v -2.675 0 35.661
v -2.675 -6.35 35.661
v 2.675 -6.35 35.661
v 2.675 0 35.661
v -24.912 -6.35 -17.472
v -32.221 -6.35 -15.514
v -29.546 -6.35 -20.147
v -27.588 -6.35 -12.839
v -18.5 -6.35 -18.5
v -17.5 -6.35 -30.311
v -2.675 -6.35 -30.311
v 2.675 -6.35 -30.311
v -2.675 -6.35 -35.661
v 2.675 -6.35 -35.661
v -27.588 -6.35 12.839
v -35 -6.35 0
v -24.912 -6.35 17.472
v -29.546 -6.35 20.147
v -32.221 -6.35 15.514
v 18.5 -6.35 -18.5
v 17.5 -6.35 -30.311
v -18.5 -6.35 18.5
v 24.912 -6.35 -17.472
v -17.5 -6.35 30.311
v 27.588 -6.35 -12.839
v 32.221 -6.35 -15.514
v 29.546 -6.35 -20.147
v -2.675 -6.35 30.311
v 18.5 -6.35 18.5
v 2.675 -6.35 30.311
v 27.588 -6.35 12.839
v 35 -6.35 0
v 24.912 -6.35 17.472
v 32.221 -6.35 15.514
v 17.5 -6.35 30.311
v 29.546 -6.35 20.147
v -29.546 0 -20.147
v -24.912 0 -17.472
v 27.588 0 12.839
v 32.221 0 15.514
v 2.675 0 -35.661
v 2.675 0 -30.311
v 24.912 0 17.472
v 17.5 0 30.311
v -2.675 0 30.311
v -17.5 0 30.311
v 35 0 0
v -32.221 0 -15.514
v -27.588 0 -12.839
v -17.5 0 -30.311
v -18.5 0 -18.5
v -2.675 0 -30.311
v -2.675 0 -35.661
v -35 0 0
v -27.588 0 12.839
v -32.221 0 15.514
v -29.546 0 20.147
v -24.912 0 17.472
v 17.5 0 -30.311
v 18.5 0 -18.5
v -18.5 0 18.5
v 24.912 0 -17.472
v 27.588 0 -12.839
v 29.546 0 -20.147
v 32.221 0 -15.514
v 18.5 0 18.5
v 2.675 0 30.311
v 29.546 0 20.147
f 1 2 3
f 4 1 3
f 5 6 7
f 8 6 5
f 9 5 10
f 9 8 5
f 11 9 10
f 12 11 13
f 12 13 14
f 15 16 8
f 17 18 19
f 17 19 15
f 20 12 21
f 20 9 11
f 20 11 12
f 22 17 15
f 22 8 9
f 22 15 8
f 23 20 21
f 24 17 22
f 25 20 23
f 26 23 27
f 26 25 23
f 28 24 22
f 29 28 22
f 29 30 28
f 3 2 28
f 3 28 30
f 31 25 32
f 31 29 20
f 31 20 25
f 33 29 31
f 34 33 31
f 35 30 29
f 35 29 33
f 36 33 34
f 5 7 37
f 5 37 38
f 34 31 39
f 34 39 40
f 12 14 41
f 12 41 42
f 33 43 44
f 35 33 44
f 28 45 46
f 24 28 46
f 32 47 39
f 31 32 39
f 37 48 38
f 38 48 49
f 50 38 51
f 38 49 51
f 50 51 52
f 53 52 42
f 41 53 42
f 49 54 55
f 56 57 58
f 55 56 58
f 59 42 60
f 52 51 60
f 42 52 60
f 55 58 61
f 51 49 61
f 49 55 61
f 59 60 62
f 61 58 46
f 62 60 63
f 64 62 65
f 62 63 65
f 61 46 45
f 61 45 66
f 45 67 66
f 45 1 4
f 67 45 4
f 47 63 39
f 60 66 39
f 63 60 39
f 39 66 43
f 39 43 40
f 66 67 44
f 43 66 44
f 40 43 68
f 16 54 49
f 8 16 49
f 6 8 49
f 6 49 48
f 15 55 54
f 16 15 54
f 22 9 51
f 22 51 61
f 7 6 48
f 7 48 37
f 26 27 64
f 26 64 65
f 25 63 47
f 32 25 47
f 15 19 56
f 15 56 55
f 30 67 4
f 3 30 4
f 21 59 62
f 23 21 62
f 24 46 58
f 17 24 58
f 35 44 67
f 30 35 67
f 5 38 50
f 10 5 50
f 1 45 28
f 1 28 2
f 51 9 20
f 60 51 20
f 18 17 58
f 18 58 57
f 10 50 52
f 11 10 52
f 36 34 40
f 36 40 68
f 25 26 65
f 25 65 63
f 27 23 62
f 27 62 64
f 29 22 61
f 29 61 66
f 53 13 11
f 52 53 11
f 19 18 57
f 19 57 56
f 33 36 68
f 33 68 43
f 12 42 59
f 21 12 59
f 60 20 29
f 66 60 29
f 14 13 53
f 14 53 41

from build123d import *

# Parameters (mm, degrees)
F1_DEPTH = 6.35
F2_W     = 5.35
F2_H     = 5.35
F3_DEPTH = 6.35
F4_W     = 37
F4_H     = 37
F5_DEPTH = 25


# Not quite as in the source:
# - a length typed as a fraction of an inch, garbled in the dataset ("3 / 203.2 mm" for 3/8 in), is restored


with BuildPart() as f1:
    # F0 (on Front) → F1 (new body)
    with BuildSketch(Plane.XZ):
        Polygon((17.5, -30.3108891325), (35, 0), (17.5, 30.3108891325), (-17.5, 30.3108891325), (-35, 0), (-17.5, -30.3108891325), align=None)
    extrude(amount=F1_DEPTH)

    # F2 (on face) → F3 (join)
    with BuildSketch(Plane.XZ.offset(6.35)):
        with Locations((0, 32.9858891325)):
            Rectangle(F2_W, F2_H)
        with Locations((0, -32.9858891325)):
            Rectangle(F2_W, F2_H)
        Polygon((29.5457359102, 20.1470625214), (24.9125, 17.4720625214), (27.5875, 12.8388266111), (32.2207359102, 15.5138266111), align=None)
        Polygon((-32.2207359102, 15.5138266111), (-27.5875, 12.8388266111), (-24.9125, 17.4720625214), (-29.5457359102, 20.1470625214), align=None)
        Polygon((-24.9125, -17.4720625214), (-27.5875, -12.8388266111), (-32.2207359102, -15.5138266111), (-29.5457359102, -20.1470625214), align=None)
        Polygon((27.5875, -12.8388266111), (24.9125, -17.4720625214), (29.5457359102, -20.1470625214), (32.2207359102, -15.5138266111), align=None)
    extrude(amount=-F3_DEPTH)

    # F4 (on face) → F5 (cut)
    with BuildSketch(Plane.XZ.offset(6.35)):
        Rectangle(F4_W, F4_H)
    extrude(amount=-F5_DEPTH, mode=Mode.SUBTRACT)


solid = f1.part
